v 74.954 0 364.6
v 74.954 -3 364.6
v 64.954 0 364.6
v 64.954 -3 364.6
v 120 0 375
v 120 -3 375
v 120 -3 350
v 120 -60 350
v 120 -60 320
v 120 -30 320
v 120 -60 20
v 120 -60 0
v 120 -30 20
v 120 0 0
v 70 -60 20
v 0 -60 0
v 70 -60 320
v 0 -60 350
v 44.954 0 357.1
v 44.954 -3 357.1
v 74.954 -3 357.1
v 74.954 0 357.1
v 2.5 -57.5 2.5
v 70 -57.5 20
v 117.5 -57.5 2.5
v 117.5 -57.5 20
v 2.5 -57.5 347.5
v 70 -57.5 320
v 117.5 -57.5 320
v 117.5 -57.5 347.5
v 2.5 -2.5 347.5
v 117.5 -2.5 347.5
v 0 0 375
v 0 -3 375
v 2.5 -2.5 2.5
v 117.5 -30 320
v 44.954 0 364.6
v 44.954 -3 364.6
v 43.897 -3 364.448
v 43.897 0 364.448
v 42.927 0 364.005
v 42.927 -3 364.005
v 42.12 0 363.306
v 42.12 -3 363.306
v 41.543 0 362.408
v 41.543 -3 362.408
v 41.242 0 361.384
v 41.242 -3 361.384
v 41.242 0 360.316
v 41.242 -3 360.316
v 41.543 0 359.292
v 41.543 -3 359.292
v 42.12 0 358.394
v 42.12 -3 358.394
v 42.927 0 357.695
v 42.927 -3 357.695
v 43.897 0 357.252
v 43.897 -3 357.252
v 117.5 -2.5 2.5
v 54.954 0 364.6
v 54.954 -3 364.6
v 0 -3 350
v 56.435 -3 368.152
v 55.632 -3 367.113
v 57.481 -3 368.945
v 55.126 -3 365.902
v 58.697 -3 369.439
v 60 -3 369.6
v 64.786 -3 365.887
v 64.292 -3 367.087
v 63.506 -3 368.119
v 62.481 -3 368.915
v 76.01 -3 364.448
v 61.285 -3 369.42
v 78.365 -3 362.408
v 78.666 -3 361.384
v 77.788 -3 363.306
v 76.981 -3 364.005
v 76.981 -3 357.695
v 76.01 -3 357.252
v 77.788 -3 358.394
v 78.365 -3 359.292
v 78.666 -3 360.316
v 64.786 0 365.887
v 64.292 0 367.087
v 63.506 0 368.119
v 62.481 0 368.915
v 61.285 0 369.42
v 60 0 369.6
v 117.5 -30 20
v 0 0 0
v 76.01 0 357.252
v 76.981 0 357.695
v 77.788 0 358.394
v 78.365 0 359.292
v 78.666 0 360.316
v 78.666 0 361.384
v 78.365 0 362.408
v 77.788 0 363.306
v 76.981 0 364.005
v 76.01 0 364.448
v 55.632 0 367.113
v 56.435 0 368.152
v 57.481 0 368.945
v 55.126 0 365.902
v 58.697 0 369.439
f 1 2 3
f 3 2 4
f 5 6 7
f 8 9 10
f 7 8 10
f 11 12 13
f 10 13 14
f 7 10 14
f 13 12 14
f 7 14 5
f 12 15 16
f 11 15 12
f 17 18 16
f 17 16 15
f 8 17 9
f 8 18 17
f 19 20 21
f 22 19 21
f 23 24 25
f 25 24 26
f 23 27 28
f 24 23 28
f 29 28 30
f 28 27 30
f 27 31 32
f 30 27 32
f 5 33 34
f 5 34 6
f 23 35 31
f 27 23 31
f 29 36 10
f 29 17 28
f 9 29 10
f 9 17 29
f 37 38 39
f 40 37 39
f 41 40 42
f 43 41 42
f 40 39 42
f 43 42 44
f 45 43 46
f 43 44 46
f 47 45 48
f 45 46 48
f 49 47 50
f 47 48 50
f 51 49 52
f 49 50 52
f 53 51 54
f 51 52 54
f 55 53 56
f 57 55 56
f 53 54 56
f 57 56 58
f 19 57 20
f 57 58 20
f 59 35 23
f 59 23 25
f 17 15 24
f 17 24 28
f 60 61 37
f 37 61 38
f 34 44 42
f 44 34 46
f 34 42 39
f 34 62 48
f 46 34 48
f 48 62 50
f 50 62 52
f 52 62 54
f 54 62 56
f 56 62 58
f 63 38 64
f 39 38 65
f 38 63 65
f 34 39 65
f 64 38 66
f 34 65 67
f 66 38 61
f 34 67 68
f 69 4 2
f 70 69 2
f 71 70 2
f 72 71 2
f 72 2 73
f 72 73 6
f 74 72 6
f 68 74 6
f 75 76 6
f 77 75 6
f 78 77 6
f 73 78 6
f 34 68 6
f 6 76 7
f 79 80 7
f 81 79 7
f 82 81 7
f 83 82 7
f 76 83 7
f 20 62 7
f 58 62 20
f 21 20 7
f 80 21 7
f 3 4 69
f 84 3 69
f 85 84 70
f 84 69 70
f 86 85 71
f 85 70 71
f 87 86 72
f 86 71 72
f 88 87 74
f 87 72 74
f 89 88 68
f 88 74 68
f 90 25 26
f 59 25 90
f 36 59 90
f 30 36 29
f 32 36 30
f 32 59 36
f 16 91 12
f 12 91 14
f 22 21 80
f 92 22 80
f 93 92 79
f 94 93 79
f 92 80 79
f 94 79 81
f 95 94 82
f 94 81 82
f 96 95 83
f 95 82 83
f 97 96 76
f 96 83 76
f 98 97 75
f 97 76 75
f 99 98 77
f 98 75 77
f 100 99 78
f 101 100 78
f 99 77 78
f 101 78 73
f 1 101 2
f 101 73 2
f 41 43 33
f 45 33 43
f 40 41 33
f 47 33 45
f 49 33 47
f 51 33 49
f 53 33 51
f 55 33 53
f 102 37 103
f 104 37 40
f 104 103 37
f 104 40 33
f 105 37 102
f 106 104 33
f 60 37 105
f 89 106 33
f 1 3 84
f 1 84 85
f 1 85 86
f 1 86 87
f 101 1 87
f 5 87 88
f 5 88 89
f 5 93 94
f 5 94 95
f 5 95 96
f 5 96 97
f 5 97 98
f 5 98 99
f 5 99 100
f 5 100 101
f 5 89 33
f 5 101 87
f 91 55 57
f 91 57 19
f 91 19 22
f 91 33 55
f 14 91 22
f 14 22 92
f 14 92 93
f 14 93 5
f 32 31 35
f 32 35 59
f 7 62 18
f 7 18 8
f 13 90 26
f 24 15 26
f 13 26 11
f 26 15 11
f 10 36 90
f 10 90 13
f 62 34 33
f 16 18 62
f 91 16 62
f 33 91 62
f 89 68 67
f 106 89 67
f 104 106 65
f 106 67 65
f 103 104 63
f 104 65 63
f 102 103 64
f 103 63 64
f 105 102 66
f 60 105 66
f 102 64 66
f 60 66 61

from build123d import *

# Parameters (mm, degrees)
F0_W     = 120
F0_H     = 350
F1_DEPTH = 60
F2_W     = 50
F2_H     = 300
F3_DEPTH = 30
F4_T     = -2.5
F5_W     = 120
F5_H     = 3
F6_DEPTH = 25
F8_DEPTH = 25


with BuildPart() as f1:
    # F0 (on Front) → F1 (new body)
    with BuildSketch(Plane.XZ):
        with Locations((60, 175)):
            Rectangle(F0_W, F0_H)
    extrude(amount=F1_DEPTH)

    # F2 (on face) → F3 (cut)
    with BuildSketch(Plane.XZ.offset(60)):
        with Locations((95, 170)):
            Rectangle(F2_W, F2_H)
    extrude(amount=-F3_DEPTH, mode=Mode.SUBTRACT)

    # F4
    f4_openings = [f1.faces().sort_by_distance(p)[0] for p in [
        (95, -45, 20),
        (70, -45, 170),
        (95, -30, 170),
        (95, -45, 320),
    ]]
    offset(amount=F4_T, openings=f4_openings)

    # F5 (on face) → F6 (join)
    with BuildSketch(Plane.XY.offset(350)):
        with Locations((60, -1.5)):
            Rectangle(F5_W, F5_H)
    extrude(amount=F6_DEPTH)

    # F7 (on face) → F8 (cut)
    with BuildSketch(Plane.XZ.offset(3)):
        with BuildLine():
            ThreePointArc((64.953983, 364.60001), (63.505749, 368.119237), (60, 369.599798))
            ThreePointArc((60, 369.599798), (56.434756, 368.151776), (54.953983, 364.60001))
            Line((54.953983, 364.60001), (44.953983, 364.60001))
            ThreePointArc((44.953983, 364.60001), (41.203983, 360.85001), (44.953983, 357.10001))
            Line((44.953983, 357.10001), (74.953983, 357.10001))
            ThreePointArc((74.953983, 357.10001), (78.703983, 360.85001), (74.953983, 364.60001))
            Line((74.953983, 364.60001), (64.953983, 364.60001))
        make_face()
    extrude(amount=-F8_DEPTH, mode=Mode.SUBTRACT)


solid = f1.part
